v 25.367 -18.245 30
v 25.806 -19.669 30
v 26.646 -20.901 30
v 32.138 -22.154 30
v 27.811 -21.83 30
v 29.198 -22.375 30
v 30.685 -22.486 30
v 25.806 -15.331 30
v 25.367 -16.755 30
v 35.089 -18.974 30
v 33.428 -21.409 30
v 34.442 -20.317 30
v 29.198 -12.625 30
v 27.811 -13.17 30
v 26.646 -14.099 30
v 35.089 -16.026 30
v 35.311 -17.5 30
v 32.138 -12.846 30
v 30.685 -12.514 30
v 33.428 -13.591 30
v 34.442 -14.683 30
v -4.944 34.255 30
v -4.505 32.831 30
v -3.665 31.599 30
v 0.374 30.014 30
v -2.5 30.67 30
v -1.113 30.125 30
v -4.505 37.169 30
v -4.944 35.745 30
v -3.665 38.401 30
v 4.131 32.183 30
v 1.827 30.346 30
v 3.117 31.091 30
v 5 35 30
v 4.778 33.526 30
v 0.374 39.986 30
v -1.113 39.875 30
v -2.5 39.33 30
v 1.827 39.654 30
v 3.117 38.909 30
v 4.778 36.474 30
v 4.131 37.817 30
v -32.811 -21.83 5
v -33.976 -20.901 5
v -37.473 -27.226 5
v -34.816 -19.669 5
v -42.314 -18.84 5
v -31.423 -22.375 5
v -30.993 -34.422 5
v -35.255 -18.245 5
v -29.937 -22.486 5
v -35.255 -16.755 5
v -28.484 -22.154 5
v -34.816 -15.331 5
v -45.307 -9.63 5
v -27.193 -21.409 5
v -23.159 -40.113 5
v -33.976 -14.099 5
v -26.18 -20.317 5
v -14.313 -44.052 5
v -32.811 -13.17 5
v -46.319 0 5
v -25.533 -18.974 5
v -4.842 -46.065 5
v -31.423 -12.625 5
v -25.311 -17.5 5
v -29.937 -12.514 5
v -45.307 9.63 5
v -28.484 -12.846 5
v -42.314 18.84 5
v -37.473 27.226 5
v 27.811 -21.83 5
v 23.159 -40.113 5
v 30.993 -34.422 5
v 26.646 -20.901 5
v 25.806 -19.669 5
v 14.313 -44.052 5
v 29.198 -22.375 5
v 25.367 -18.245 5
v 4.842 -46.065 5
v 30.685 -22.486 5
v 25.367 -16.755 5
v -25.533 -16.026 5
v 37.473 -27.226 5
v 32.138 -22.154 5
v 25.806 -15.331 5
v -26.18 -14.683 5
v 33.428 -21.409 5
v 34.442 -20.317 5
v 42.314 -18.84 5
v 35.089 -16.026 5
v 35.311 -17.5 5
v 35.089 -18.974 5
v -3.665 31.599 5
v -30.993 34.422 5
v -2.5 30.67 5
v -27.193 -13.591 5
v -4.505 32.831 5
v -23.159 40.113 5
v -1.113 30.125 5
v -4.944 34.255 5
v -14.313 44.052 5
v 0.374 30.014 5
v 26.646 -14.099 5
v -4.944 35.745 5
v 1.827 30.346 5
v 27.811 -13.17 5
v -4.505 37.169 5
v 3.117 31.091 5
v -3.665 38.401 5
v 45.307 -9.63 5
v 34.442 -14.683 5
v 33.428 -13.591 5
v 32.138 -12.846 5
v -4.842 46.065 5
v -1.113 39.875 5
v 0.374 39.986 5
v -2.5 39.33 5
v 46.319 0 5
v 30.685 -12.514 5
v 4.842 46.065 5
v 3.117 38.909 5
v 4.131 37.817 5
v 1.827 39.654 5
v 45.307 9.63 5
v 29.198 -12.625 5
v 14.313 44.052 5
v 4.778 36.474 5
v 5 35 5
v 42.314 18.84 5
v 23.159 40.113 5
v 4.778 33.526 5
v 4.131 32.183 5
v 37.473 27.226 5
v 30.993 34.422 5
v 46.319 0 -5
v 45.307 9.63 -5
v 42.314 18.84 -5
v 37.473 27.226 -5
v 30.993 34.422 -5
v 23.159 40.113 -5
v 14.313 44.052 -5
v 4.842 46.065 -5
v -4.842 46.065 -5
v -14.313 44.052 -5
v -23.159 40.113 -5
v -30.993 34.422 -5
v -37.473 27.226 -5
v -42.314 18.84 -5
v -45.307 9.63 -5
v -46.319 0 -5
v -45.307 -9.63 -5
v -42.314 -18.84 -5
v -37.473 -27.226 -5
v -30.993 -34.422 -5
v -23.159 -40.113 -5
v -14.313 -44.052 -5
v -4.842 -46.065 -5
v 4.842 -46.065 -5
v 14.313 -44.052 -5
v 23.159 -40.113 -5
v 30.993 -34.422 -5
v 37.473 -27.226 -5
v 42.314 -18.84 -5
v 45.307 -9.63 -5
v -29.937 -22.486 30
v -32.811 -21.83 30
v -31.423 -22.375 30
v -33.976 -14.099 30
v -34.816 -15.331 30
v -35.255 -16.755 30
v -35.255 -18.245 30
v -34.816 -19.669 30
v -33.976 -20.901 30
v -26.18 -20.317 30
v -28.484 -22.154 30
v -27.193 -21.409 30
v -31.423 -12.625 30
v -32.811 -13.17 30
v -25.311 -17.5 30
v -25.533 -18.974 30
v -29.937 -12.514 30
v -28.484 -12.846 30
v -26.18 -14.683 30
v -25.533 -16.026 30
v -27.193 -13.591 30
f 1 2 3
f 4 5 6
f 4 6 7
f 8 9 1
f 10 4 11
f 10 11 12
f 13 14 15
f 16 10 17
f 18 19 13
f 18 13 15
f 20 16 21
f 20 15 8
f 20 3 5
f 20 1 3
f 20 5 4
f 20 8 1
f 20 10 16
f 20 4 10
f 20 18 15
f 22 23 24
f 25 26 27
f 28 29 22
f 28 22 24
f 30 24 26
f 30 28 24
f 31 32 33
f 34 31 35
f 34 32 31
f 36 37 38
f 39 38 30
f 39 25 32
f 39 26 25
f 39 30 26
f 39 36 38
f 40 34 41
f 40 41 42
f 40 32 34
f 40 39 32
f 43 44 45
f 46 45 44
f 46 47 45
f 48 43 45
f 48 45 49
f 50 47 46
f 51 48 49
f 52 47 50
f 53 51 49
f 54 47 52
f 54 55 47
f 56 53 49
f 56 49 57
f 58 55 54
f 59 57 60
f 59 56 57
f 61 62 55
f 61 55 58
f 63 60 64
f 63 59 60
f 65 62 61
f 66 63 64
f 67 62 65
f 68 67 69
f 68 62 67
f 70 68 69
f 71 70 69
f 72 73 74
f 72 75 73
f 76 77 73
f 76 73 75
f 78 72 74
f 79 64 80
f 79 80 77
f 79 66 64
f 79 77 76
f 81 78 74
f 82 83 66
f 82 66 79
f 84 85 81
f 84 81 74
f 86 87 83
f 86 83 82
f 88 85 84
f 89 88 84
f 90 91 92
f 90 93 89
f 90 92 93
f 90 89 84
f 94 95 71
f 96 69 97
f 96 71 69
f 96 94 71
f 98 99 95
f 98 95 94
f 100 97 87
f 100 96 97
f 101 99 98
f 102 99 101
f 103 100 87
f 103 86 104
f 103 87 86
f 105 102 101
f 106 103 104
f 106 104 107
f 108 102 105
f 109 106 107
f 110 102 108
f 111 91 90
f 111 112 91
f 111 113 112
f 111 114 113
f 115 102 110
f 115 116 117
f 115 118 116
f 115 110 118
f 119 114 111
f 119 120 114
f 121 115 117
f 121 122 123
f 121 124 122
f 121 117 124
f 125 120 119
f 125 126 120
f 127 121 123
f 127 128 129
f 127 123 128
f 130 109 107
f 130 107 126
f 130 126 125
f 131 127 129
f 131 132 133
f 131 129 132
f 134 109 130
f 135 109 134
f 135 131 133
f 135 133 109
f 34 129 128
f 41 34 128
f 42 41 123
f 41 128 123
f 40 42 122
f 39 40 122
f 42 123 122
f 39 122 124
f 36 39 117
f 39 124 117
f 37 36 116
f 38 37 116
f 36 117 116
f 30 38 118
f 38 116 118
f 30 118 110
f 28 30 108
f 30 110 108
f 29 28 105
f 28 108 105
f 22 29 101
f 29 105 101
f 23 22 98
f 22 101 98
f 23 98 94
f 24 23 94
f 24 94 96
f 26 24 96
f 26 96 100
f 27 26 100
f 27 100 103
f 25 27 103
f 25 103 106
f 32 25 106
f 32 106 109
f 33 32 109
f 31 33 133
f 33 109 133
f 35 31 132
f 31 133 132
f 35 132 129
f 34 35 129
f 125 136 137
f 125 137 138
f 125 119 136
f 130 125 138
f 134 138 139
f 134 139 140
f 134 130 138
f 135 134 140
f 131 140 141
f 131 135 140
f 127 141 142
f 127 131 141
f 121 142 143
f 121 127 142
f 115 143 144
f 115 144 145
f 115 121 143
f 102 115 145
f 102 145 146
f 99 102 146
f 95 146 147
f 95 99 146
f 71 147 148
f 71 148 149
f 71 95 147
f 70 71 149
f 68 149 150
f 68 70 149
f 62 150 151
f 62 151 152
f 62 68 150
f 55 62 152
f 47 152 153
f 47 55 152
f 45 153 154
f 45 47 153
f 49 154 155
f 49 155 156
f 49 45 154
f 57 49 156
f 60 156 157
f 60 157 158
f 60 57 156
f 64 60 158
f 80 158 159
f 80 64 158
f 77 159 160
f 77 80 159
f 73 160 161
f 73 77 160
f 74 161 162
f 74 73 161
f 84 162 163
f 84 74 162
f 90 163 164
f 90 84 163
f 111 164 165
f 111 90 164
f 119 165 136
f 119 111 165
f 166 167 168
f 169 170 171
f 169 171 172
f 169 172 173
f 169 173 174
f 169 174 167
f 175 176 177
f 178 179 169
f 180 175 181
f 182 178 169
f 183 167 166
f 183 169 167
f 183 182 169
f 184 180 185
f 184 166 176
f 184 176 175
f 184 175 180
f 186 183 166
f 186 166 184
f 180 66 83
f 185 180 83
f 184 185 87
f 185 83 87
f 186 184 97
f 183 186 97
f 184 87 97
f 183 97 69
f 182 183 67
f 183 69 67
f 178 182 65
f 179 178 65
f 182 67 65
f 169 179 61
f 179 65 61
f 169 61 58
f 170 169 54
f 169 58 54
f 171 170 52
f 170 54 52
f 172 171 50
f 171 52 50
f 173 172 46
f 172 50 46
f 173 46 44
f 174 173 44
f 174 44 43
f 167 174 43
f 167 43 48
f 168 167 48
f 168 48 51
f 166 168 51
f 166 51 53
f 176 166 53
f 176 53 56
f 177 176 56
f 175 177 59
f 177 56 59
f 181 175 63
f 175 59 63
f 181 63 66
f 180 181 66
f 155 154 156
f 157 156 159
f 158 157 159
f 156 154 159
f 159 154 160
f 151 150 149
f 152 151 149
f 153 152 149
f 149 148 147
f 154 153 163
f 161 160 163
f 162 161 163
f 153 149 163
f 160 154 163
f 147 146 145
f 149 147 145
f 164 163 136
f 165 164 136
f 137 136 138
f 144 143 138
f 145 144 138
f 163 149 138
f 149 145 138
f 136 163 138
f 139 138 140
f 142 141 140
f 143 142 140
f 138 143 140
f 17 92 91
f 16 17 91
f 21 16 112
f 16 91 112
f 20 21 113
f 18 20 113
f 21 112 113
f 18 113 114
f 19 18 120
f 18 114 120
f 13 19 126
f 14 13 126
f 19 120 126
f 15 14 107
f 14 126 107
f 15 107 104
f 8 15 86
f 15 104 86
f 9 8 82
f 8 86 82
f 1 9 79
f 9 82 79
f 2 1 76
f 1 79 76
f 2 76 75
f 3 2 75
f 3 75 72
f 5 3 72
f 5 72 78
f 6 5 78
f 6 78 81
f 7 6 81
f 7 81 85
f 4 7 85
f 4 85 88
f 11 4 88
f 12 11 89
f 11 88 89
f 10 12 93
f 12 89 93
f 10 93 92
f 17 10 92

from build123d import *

# Parameters (mm, degrees)
F0_R     = 46.318814
F1_DEPTH = 5
F2_R     = 5
F3_DEPTH = 25


with BuildPart() as f1:
    # F0 (on Top) → F1 (new body, symmetric)
    with BuildSketch(Plane.XY):
        Circle(F0_R)
    extrude(amount=F1_DEPTH, both=True)

    # F2 (on face) → F3 (join)
    with BuildSketch(Plane.XY.offset(5)):
        with Locations((0, 35)):
            Circle(F2_R)
        with Locations((-30.310889, -17.5)):
            Circle(F2_R)
        with Locations((30.310889, -17.5)):
            Circle(F2_R)
    extrude(amount=F3_DEPTH)


solid = f1.part
